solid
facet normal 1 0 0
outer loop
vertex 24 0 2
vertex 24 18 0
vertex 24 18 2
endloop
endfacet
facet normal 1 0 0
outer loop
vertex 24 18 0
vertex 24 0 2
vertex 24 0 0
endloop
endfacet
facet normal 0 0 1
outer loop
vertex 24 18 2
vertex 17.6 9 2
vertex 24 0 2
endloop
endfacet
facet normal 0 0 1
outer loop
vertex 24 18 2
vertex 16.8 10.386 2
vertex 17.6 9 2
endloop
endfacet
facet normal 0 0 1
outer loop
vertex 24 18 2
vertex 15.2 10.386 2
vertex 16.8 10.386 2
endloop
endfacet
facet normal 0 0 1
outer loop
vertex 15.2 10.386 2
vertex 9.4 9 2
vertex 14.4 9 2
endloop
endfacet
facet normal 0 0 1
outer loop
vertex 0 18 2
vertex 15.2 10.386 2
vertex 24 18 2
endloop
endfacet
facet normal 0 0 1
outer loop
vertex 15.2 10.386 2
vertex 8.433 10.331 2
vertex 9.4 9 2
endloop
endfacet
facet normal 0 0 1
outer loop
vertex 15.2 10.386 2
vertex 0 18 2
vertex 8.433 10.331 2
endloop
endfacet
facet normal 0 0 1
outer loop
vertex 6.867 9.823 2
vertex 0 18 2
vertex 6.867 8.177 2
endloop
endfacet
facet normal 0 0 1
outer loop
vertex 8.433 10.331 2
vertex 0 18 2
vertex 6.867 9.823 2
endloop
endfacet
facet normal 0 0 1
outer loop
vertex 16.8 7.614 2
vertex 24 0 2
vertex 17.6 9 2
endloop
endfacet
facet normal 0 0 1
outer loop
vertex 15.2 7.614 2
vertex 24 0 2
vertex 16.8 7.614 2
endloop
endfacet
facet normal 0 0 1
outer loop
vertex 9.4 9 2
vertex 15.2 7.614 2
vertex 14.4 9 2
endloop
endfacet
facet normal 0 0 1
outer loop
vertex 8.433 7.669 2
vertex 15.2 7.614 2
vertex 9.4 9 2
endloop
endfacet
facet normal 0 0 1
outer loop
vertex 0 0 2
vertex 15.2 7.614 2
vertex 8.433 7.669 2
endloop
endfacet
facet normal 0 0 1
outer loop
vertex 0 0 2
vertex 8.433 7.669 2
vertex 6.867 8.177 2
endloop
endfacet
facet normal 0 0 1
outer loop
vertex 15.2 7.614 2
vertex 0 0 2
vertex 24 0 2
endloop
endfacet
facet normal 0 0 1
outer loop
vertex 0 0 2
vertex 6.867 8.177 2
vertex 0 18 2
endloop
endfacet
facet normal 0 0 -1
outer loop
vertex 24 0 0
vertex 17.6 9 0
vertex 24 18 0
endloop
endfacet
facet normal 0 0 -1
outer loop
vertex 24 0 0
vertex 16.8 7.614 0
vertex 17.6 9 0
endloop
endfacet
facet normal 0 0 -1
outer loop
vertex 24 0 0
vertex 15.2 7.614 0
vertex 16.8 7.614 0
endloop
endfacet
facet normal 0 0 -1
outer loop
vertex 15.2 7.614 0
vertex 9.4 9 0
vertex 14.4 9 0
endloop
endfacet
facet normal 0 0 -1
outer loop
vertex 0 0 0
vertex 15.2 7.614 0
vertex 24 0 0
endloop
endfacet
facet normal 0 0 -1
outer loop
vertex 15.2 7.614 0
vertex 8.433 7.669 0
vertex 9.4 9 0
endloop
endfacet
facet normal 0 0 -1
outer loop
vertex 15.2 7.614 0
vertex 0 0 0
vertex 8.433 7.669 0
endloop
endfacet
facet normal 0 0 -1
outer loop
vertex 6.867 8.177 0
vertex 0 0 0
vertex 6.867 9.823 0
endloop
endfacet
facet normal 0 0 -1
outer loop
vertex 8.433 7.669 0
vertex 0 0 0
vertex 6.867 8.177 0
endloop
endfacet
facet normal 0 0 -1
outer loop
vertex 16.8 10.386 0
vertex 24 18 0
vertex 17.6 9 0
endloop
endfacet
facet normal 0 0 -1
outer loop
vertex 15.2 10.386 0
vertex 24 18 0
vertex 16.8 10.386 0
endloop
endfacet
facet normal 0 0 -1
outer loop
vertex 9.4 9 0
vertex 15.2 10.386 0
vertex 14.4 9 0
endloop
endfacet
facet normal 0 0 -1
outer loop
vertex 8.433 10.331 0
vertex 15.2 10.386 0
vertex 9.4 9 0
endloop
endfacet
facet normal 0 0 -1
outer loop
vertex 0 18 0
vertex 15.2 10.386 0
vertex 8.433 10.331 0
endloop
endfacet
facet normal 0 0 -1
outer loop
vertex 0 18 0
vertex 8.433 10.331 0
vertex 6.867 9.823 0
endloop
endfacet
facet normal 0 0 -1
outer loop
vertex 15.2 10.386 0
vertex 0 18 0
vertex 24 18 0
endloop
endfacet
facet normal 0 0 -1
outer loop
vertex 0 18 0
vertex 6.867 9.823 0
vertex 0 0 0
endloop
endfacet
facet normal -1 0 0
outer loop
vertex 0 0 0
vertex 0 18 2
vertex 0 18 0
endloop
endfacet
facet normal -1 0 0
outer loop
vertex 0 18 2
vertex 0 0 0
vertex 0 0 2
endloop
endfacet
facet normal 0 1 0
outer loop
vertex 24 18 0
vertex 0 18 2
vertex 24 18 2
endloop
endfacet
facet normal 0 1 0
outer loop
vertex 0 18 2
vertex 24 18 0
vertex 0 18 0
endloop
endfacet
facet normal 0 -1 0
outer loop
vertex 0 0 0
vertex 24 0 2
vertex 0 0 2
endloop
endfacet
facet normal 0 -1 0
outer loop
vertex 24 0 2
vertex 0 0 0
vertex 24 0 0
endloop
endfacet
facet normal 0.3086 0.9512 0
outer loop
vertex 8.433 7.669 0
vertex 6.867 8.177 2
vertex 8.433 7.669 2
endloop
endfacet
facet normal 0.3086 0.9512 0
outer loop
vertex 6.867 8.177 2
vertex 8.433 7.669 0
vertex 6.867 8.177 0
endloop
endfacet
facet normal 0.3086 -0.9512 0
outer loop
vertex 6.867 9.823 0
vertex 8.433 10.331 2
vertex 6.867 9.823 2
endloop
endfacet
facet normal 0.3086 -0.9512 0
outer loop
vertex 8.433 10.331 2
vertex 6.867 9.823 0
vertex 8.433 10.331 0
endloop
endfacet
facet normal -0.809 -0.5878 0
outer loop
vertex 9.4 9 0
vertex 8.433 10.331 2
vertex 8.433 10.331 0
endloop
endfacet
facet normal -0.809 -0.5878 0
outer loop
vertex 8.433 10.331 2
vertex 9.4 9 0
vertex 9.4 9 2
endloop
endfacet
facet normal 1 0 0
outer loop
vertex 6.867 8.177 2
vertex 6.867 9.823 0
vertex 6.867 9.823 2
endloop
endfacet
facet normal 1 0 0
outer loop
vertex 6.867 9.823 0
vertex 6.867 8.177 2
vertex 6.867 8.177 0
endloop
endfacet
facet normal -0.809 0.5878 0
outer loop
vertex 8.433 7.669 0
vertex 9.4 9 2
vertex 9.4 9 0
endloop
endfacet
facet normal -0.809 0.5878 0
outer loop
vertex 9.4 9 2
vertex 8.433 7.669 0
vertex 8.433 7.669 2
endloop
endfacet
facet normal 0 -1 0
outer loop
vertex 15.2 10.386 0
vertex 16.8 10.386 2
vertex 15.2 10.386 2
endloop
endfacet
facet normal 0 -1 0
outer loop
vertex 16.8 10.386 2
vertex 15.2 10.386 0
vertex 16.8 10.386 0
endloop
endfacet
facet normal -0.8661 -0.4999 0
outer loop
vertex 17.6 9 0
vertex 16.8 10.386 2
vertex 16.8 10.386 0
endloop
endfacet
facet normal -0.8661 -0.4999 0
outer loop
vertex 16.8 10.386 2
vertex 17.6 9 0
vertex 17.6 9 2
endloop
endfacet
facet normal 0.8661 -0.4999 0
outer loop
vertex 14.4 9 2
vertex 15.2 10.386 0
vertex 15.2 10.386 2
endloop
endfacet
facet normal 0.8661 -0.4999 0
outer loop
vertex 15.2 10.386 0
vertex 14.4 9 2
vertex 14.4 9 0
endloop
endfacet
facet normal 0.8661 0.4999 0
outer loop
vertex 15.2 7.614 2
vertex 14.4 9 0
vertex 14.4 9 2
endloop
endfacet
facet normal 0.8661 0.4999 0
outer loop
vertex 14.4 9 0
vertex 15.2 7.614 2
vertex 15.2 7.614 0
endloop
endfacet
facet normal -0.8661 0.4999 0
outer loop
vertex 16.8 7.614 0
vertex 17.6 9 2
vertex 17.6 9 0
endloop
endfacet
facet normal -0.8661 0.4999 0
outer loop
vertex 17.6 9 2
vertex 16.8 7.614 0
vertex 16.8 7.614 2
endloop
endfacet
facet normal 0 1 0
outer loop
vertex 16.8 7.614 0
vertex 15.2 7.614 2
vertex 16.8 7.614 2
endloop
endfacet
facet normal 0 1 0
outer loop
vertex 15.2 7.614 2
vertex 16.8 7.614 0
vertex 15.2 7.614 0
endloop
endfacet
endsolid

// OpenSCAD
// file: sample_lib.scad
module peg(r=2, h=10) {
  cylinder(r=r, h=h);
}

module base_plate(size=[20, 20, 2]) {
  cube(size);
}
// main file
use <sample_lib.scad>;

function slot_r(n) = let(base = 1 + n * 0.2) base;

plate_w = 18 + 6;

if (plate_w >= 24 && slot_r(2) > 1.3) {
  difference() {
    base_plate(size=[plate_w, 18, 2]);
    translate([8, 9, 0]) cylinder(r=slot_r(2), h=2);
    translate([16, 9, 0]) cylinder(r=slot_r(3), h=2);
  }
} else {
  cube([8, 8, 2]);
}
